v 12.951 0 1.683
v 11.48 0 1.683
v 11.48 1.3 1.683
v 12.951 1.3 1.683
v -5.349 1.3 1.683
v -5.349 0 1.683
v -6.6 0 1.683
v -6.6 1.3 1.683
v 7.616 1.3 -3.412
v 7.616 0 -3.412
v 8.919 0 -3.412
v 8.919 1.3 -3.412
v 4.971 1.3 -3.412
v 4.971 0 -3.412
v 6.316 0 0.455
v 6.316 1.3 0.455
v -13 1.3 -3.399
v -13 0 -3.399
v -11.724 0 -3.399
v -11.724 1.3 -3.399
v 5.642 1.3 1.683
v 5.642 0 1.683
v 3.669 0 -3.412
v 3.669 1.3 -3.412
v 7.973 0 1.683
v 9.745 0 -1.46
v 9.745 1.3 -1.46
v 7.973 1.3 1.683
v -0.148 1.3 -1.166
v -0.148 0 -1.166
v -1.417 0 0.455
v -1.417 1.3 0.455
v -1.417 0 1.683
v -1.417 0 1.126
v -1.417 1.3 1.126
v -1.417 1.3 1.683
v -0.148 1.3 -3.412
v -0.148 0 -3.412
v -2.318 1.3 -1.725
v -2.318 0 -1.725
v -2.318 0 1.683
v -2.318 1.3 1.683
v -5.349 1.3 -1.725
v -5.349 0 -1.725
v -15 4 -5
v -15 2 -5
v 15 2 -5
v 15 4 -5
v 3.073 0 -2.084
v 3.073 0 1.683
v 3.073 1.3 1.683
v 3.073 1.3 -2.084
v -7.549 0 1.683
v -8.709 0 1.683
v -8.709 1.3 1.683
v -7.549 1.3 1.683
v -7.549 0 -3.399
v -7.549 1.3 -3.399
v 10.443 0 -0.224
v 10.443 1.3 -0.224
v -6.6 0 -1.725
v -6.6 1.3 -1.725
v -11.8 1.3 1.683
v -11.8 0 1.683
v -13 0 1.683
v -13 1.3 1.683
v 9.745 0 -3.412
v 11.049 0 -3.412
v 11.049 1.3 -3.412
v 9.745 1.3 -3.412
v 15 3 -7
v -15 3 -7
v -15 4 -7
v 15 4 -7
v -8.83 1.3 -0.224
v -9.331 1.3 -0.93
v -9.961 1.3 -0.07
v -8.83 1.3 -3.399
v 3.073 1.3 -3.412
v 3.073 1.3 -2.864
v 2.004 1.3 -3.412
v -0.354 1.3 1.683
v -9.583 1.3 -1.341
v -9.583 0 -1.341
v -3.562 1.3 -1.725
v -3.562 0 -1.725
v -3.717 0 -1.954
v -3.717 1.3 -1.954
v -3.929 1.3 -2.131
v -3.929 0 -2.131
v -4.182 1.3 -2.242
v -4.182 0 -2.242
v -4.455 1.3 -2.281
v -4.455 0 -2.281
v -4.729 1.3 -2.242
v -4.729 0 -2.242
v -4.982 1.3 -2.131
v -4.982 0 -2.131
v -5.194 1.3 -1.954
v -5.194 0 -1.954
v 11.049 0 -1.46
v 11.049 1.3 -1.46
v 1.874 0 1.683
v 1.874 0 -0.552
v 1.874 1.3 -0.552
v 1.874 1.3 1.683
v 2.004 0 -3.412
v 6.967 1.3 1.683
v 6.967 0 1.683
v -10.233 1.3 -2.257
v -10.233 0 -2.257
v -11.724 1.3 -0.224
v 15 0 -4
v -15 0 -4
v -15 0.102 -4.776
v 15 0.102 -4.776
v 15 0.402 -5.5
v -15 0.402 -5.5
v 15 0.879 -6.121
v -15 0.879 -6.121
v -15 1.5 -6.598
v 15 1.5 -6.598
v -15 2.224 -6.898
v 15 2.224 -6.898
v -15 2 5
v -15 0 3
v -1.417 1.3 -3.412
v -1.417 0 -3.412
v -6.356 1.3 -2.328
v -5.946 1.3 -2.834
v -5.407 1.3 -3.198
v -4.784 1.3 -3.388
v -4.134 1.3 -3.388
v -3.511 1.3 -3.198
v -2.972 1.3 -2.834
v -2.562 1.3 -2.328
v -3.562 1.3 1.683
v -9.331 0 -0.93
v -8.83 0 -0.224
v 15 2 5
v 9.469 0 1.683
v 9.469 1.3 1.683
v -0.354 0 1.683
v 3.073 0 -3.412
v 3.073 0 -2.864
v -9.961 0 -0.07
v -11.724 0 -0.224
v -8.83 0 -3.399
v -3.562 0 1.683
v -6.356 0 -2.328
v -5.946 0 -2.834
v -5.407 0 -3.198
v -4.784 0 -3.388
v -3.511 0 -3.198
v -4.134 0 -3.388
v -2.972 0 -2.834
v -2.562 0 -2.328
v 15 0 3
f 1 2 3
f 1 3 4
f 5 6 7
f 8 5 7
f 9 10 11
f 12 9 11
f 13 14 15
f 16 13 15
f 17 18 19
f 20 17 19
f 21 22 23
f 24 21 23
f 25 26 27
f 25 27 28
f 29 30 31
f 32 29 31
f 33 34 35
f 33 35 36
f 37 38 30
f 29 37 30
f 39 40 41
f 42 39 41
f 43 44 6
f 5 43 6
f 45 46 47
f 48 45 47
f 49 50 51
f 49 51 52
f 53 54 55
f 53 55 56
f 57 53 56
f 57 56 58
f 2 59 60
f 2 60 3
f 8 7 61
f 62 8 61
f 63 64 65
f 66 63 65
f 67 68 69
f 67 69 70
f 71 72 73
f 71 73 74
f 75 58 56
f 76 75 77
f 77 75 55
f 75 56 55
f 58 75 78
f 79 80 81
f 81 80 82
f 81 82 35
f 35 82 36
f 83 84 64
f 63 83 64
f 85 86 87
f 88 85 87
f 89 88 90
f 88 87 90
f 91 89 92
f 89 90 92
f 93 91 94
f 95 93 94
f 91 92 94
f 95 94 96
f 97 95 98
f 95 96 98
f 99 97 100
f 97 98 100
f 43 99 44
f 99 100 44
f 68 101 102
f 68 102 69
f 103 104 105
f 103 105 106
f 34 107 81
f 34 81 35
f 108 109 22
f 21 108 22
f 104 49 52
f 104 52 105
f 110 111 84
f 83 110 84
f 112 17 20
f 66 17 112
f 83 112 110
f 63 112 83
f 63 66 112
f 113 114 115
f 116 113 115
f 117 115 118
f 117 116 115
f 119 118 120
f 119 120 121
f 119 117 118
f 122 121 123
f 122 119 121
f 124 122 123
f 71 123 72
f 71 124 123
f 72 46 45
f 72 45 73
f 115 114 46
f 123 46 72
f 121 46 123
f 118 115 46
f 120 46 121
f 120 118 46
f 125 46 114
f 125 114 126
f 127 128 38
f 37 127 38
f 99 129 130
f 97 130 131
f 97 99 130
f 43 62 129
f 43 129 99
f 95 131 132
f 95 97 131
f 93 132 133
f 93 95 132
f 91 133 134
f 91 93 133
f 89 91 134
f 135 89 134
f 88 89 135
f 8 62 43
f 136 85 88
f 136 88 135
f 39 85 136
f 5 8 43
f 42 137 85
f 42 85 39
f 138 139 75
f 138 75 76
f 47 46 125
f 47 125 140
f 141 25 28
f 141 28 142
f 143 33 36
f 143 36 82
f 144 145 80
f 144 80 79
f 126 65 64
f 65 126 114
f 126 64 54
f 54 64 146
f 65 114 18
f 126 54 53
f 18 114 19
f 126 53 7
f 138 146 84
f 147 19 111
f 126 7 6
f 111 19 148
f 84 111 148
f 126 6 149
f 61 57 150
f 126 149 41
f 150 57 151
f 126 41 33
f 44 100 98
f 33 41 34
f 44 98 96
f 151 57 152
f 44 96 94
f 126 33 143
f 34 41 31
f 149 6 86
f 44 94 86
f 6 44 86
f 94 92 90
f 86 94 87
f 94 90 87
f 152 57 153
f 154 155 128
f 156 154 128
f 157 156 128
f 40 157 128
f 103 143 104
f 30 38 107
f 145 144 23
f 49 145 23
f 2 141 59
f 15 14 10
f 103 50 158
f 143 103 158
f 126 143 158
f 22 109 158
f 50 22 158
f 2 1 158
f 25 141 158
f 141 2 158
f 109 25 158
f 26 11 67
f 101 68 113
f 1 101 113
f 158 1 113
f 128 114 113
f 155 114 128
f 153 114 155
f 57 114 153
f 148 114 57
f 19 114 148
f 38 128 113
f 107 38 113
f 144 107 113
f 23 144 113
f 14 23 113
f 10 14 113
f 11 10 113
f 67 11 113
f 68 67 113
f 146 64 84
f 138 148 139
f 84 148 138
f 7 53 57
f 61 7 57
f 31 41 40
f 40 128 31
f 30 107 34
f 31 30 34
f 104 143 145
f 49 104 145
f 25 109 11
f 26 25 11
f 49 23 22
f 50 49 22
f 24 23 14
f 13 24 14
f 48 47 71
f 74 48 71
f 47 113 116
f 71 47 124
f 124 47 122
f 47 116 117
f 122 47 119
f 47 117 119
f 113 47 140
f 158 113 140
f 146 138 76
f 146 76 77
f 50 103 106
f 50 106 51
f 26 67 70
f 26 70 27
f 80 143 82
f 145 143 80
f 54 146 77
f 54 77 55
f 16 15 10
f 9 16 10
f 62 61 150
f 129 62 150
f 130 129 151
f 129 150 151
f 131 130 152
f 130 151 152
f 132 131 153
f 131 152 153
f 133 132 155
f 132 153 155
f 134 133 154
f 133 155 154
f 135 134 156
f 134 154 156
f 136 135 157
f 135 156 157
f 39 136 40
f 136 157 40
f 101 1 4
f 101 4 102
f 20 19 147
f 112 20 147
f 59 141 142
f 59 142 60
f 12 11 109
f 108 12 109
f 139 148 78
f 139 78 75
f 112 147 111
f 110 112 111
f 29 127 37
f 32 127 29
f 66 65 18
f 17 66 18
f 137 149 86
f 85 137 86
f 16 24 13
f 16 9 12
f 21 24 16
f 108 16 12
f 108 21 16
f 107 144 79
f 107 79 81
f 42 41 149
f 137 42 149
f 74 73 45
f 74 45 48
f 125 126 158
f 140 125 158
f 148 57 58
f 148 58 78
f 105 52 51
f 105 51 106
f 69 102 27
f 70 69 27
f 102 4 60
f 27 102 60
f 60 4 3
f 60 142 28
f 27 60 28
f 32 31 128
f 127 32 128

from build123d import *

# Parameters (mm, degrees)
CROQUIS1_W                   = 30
CROQUIS1_H                   = 10
SALIENTE_EXTRUIR1_DEPTH      = 2
SALIENTE_EXTRUIR2_DEPTH      = 2
SALIENTE_EXTRUIR2_DEPTH_BACK = 2
CROQUIS2_W                   = 30
CROQUIS2_H                   = 2
CHAFL_N1_SIZE                = 2
REDONDEO1_R                  = 3
CORTAR_EXTRUIR1_DEPTH        = 1.3


with BuildPart() as part:
    # Croquis1 → Saliente-Extruir1 (new body)
    with BuildSketch(Plane(origin=(0, 0, 0), x_dir=(1, 0, 0), z_dir=(0, 1, 0))):
        Rectangle(CROQUIS1_W, CROQUIS1_H)
    extrude(amount=SALIENTE_EXTRUIR1_DEPTH)

    # Croquis2 → Saliente-Extruir2 (add, two sides: drawn at the far end of the back side and taken through both)
    with BuildSketch(Plane(origin=(0, 2, 0), x_dir=(1, 0, 0), z_dir=(0, 1, 0)).offset(-SALIENTE_EXTRUIR2_DEPTH_BACK)):
        with Locations((0, 6)):
            Rectangle(CROQUIS2_W, CROQUIS2_H)
    extrude(amount=SALIENTE_EXTRUIR2_DEPTH + SALIENTE_EXTRUIR2_DEPTH_BACK)

    # Chaflán1
    chafl_n1_edges = [part.edges().sort_by_distance(p)[0] for p in [
        (0, 0, 5),
    ]]
    chamfer(chafl_n1_edges, length=CHAFL_N1_SIZE - 0.0001)  # a hair under: the kernel refuses the full size

    # Redondeo1
    redondeo1_edges = [part.edges().sort_by_distance(p)[0] for p in [
        (0, 0, -7),
    ]]
    fillet(redondeo1_edges, radius=REDONDEO1_R)

    # Croquis3 → Cortar-Extruir1 (cut)
    with BuildSketch(Plane.XZ):
        Polygon((-9.961494987, -0.07018817), (-8.709002423, 1.683238665), (-7.549155707, 1.683238665), (-7.549155707, -3.398633507), (-8.83001578, -3.398633507), (-8.83001578, -0.22414092), (-9.330931139, -0.930250522), align=None)
        Polygon((-11.80023979, 1.683238665), (-13, 1.683238665), (-13, -3.398633507), (-11.724069575, -3.398633507), (-11.724069575, -0.22414092), (-10.233410768, -2.257336324), (-9.583176724, -1.340741346), align=None)
        with BuildLine():
            Line((-6.600409237, 1.683238665), (-6.600409237, -1.725226293))
            ThreePointArc((-6.600409237, -1.725226293), (-4.45912989, -3.411949657), (-2.317850543, -1.725226293))
            Line((-2.317850543, -1.725226293), (-2.317850543, 1.683238665))
            Line((-2.317850543, 1.683238665), (-3.56164133, 1.683238665))
            Line((-3.56164133, 1.683238665), (-3.56164133, -1.725226293))
            ThreePointArc((-3.56164133, -1.725226293), (-4.455396596, -2.280675862), (-5.349151863, -1.725226293))
            Line((-5.349151863, -1.725226293), (-5.349151863, 1.683238665))
            Line((-5.349151863, 1.683238665), (-6.600409237, 1.683238665))
        make_face()
        Polygon((-0.147635828, -1.165769584), (-1.416632441, 0.454814455), (-1.416632441, -3.411949657), (-0.147635828, -3.411949657), align=None)
        Polygon((-1.416632441, 1.126001398), (-1.416632441, 1.683238665), (-0.354158469, 1.683238665), (3.073485226, -2.863879645), (3.073485226, -3.411949657), (2.004100926, -3.411949657), align=None)
        Polygon((1.874218963, -0.552422461), (1.874218963, 1.683238665), (3.073485226, 1.683238665), (3.073485226, -2.083956703), align=None)
        Polygon((6.967028865, 1.683238665), (5.642411569, 1.683238665), (3.668591411, -3.411949657), (4.971319865, -3.411949657), (6.315646772, 0.454814455), (7.616337035, -3.411949657), (8.919127609, -3.411949657), align=None)
        Polygon((9.744634122, -1.460252001), (7.972604821, 1.683238665), (9.46859716, 1.683238665), (10.442731706, -0.22414092), (11.480463321, 1.683238665), (12.951143356, 1.683238665), (11.048523586, -1.460252001), (11.048523586, -3.411949657), (9.744634122, -3.411949657), align=None)
    extrude(amount=-CORTAR_EXTRUIR1_DEPTH, mode=Mode.SUBTRACT)


solid = part.part
